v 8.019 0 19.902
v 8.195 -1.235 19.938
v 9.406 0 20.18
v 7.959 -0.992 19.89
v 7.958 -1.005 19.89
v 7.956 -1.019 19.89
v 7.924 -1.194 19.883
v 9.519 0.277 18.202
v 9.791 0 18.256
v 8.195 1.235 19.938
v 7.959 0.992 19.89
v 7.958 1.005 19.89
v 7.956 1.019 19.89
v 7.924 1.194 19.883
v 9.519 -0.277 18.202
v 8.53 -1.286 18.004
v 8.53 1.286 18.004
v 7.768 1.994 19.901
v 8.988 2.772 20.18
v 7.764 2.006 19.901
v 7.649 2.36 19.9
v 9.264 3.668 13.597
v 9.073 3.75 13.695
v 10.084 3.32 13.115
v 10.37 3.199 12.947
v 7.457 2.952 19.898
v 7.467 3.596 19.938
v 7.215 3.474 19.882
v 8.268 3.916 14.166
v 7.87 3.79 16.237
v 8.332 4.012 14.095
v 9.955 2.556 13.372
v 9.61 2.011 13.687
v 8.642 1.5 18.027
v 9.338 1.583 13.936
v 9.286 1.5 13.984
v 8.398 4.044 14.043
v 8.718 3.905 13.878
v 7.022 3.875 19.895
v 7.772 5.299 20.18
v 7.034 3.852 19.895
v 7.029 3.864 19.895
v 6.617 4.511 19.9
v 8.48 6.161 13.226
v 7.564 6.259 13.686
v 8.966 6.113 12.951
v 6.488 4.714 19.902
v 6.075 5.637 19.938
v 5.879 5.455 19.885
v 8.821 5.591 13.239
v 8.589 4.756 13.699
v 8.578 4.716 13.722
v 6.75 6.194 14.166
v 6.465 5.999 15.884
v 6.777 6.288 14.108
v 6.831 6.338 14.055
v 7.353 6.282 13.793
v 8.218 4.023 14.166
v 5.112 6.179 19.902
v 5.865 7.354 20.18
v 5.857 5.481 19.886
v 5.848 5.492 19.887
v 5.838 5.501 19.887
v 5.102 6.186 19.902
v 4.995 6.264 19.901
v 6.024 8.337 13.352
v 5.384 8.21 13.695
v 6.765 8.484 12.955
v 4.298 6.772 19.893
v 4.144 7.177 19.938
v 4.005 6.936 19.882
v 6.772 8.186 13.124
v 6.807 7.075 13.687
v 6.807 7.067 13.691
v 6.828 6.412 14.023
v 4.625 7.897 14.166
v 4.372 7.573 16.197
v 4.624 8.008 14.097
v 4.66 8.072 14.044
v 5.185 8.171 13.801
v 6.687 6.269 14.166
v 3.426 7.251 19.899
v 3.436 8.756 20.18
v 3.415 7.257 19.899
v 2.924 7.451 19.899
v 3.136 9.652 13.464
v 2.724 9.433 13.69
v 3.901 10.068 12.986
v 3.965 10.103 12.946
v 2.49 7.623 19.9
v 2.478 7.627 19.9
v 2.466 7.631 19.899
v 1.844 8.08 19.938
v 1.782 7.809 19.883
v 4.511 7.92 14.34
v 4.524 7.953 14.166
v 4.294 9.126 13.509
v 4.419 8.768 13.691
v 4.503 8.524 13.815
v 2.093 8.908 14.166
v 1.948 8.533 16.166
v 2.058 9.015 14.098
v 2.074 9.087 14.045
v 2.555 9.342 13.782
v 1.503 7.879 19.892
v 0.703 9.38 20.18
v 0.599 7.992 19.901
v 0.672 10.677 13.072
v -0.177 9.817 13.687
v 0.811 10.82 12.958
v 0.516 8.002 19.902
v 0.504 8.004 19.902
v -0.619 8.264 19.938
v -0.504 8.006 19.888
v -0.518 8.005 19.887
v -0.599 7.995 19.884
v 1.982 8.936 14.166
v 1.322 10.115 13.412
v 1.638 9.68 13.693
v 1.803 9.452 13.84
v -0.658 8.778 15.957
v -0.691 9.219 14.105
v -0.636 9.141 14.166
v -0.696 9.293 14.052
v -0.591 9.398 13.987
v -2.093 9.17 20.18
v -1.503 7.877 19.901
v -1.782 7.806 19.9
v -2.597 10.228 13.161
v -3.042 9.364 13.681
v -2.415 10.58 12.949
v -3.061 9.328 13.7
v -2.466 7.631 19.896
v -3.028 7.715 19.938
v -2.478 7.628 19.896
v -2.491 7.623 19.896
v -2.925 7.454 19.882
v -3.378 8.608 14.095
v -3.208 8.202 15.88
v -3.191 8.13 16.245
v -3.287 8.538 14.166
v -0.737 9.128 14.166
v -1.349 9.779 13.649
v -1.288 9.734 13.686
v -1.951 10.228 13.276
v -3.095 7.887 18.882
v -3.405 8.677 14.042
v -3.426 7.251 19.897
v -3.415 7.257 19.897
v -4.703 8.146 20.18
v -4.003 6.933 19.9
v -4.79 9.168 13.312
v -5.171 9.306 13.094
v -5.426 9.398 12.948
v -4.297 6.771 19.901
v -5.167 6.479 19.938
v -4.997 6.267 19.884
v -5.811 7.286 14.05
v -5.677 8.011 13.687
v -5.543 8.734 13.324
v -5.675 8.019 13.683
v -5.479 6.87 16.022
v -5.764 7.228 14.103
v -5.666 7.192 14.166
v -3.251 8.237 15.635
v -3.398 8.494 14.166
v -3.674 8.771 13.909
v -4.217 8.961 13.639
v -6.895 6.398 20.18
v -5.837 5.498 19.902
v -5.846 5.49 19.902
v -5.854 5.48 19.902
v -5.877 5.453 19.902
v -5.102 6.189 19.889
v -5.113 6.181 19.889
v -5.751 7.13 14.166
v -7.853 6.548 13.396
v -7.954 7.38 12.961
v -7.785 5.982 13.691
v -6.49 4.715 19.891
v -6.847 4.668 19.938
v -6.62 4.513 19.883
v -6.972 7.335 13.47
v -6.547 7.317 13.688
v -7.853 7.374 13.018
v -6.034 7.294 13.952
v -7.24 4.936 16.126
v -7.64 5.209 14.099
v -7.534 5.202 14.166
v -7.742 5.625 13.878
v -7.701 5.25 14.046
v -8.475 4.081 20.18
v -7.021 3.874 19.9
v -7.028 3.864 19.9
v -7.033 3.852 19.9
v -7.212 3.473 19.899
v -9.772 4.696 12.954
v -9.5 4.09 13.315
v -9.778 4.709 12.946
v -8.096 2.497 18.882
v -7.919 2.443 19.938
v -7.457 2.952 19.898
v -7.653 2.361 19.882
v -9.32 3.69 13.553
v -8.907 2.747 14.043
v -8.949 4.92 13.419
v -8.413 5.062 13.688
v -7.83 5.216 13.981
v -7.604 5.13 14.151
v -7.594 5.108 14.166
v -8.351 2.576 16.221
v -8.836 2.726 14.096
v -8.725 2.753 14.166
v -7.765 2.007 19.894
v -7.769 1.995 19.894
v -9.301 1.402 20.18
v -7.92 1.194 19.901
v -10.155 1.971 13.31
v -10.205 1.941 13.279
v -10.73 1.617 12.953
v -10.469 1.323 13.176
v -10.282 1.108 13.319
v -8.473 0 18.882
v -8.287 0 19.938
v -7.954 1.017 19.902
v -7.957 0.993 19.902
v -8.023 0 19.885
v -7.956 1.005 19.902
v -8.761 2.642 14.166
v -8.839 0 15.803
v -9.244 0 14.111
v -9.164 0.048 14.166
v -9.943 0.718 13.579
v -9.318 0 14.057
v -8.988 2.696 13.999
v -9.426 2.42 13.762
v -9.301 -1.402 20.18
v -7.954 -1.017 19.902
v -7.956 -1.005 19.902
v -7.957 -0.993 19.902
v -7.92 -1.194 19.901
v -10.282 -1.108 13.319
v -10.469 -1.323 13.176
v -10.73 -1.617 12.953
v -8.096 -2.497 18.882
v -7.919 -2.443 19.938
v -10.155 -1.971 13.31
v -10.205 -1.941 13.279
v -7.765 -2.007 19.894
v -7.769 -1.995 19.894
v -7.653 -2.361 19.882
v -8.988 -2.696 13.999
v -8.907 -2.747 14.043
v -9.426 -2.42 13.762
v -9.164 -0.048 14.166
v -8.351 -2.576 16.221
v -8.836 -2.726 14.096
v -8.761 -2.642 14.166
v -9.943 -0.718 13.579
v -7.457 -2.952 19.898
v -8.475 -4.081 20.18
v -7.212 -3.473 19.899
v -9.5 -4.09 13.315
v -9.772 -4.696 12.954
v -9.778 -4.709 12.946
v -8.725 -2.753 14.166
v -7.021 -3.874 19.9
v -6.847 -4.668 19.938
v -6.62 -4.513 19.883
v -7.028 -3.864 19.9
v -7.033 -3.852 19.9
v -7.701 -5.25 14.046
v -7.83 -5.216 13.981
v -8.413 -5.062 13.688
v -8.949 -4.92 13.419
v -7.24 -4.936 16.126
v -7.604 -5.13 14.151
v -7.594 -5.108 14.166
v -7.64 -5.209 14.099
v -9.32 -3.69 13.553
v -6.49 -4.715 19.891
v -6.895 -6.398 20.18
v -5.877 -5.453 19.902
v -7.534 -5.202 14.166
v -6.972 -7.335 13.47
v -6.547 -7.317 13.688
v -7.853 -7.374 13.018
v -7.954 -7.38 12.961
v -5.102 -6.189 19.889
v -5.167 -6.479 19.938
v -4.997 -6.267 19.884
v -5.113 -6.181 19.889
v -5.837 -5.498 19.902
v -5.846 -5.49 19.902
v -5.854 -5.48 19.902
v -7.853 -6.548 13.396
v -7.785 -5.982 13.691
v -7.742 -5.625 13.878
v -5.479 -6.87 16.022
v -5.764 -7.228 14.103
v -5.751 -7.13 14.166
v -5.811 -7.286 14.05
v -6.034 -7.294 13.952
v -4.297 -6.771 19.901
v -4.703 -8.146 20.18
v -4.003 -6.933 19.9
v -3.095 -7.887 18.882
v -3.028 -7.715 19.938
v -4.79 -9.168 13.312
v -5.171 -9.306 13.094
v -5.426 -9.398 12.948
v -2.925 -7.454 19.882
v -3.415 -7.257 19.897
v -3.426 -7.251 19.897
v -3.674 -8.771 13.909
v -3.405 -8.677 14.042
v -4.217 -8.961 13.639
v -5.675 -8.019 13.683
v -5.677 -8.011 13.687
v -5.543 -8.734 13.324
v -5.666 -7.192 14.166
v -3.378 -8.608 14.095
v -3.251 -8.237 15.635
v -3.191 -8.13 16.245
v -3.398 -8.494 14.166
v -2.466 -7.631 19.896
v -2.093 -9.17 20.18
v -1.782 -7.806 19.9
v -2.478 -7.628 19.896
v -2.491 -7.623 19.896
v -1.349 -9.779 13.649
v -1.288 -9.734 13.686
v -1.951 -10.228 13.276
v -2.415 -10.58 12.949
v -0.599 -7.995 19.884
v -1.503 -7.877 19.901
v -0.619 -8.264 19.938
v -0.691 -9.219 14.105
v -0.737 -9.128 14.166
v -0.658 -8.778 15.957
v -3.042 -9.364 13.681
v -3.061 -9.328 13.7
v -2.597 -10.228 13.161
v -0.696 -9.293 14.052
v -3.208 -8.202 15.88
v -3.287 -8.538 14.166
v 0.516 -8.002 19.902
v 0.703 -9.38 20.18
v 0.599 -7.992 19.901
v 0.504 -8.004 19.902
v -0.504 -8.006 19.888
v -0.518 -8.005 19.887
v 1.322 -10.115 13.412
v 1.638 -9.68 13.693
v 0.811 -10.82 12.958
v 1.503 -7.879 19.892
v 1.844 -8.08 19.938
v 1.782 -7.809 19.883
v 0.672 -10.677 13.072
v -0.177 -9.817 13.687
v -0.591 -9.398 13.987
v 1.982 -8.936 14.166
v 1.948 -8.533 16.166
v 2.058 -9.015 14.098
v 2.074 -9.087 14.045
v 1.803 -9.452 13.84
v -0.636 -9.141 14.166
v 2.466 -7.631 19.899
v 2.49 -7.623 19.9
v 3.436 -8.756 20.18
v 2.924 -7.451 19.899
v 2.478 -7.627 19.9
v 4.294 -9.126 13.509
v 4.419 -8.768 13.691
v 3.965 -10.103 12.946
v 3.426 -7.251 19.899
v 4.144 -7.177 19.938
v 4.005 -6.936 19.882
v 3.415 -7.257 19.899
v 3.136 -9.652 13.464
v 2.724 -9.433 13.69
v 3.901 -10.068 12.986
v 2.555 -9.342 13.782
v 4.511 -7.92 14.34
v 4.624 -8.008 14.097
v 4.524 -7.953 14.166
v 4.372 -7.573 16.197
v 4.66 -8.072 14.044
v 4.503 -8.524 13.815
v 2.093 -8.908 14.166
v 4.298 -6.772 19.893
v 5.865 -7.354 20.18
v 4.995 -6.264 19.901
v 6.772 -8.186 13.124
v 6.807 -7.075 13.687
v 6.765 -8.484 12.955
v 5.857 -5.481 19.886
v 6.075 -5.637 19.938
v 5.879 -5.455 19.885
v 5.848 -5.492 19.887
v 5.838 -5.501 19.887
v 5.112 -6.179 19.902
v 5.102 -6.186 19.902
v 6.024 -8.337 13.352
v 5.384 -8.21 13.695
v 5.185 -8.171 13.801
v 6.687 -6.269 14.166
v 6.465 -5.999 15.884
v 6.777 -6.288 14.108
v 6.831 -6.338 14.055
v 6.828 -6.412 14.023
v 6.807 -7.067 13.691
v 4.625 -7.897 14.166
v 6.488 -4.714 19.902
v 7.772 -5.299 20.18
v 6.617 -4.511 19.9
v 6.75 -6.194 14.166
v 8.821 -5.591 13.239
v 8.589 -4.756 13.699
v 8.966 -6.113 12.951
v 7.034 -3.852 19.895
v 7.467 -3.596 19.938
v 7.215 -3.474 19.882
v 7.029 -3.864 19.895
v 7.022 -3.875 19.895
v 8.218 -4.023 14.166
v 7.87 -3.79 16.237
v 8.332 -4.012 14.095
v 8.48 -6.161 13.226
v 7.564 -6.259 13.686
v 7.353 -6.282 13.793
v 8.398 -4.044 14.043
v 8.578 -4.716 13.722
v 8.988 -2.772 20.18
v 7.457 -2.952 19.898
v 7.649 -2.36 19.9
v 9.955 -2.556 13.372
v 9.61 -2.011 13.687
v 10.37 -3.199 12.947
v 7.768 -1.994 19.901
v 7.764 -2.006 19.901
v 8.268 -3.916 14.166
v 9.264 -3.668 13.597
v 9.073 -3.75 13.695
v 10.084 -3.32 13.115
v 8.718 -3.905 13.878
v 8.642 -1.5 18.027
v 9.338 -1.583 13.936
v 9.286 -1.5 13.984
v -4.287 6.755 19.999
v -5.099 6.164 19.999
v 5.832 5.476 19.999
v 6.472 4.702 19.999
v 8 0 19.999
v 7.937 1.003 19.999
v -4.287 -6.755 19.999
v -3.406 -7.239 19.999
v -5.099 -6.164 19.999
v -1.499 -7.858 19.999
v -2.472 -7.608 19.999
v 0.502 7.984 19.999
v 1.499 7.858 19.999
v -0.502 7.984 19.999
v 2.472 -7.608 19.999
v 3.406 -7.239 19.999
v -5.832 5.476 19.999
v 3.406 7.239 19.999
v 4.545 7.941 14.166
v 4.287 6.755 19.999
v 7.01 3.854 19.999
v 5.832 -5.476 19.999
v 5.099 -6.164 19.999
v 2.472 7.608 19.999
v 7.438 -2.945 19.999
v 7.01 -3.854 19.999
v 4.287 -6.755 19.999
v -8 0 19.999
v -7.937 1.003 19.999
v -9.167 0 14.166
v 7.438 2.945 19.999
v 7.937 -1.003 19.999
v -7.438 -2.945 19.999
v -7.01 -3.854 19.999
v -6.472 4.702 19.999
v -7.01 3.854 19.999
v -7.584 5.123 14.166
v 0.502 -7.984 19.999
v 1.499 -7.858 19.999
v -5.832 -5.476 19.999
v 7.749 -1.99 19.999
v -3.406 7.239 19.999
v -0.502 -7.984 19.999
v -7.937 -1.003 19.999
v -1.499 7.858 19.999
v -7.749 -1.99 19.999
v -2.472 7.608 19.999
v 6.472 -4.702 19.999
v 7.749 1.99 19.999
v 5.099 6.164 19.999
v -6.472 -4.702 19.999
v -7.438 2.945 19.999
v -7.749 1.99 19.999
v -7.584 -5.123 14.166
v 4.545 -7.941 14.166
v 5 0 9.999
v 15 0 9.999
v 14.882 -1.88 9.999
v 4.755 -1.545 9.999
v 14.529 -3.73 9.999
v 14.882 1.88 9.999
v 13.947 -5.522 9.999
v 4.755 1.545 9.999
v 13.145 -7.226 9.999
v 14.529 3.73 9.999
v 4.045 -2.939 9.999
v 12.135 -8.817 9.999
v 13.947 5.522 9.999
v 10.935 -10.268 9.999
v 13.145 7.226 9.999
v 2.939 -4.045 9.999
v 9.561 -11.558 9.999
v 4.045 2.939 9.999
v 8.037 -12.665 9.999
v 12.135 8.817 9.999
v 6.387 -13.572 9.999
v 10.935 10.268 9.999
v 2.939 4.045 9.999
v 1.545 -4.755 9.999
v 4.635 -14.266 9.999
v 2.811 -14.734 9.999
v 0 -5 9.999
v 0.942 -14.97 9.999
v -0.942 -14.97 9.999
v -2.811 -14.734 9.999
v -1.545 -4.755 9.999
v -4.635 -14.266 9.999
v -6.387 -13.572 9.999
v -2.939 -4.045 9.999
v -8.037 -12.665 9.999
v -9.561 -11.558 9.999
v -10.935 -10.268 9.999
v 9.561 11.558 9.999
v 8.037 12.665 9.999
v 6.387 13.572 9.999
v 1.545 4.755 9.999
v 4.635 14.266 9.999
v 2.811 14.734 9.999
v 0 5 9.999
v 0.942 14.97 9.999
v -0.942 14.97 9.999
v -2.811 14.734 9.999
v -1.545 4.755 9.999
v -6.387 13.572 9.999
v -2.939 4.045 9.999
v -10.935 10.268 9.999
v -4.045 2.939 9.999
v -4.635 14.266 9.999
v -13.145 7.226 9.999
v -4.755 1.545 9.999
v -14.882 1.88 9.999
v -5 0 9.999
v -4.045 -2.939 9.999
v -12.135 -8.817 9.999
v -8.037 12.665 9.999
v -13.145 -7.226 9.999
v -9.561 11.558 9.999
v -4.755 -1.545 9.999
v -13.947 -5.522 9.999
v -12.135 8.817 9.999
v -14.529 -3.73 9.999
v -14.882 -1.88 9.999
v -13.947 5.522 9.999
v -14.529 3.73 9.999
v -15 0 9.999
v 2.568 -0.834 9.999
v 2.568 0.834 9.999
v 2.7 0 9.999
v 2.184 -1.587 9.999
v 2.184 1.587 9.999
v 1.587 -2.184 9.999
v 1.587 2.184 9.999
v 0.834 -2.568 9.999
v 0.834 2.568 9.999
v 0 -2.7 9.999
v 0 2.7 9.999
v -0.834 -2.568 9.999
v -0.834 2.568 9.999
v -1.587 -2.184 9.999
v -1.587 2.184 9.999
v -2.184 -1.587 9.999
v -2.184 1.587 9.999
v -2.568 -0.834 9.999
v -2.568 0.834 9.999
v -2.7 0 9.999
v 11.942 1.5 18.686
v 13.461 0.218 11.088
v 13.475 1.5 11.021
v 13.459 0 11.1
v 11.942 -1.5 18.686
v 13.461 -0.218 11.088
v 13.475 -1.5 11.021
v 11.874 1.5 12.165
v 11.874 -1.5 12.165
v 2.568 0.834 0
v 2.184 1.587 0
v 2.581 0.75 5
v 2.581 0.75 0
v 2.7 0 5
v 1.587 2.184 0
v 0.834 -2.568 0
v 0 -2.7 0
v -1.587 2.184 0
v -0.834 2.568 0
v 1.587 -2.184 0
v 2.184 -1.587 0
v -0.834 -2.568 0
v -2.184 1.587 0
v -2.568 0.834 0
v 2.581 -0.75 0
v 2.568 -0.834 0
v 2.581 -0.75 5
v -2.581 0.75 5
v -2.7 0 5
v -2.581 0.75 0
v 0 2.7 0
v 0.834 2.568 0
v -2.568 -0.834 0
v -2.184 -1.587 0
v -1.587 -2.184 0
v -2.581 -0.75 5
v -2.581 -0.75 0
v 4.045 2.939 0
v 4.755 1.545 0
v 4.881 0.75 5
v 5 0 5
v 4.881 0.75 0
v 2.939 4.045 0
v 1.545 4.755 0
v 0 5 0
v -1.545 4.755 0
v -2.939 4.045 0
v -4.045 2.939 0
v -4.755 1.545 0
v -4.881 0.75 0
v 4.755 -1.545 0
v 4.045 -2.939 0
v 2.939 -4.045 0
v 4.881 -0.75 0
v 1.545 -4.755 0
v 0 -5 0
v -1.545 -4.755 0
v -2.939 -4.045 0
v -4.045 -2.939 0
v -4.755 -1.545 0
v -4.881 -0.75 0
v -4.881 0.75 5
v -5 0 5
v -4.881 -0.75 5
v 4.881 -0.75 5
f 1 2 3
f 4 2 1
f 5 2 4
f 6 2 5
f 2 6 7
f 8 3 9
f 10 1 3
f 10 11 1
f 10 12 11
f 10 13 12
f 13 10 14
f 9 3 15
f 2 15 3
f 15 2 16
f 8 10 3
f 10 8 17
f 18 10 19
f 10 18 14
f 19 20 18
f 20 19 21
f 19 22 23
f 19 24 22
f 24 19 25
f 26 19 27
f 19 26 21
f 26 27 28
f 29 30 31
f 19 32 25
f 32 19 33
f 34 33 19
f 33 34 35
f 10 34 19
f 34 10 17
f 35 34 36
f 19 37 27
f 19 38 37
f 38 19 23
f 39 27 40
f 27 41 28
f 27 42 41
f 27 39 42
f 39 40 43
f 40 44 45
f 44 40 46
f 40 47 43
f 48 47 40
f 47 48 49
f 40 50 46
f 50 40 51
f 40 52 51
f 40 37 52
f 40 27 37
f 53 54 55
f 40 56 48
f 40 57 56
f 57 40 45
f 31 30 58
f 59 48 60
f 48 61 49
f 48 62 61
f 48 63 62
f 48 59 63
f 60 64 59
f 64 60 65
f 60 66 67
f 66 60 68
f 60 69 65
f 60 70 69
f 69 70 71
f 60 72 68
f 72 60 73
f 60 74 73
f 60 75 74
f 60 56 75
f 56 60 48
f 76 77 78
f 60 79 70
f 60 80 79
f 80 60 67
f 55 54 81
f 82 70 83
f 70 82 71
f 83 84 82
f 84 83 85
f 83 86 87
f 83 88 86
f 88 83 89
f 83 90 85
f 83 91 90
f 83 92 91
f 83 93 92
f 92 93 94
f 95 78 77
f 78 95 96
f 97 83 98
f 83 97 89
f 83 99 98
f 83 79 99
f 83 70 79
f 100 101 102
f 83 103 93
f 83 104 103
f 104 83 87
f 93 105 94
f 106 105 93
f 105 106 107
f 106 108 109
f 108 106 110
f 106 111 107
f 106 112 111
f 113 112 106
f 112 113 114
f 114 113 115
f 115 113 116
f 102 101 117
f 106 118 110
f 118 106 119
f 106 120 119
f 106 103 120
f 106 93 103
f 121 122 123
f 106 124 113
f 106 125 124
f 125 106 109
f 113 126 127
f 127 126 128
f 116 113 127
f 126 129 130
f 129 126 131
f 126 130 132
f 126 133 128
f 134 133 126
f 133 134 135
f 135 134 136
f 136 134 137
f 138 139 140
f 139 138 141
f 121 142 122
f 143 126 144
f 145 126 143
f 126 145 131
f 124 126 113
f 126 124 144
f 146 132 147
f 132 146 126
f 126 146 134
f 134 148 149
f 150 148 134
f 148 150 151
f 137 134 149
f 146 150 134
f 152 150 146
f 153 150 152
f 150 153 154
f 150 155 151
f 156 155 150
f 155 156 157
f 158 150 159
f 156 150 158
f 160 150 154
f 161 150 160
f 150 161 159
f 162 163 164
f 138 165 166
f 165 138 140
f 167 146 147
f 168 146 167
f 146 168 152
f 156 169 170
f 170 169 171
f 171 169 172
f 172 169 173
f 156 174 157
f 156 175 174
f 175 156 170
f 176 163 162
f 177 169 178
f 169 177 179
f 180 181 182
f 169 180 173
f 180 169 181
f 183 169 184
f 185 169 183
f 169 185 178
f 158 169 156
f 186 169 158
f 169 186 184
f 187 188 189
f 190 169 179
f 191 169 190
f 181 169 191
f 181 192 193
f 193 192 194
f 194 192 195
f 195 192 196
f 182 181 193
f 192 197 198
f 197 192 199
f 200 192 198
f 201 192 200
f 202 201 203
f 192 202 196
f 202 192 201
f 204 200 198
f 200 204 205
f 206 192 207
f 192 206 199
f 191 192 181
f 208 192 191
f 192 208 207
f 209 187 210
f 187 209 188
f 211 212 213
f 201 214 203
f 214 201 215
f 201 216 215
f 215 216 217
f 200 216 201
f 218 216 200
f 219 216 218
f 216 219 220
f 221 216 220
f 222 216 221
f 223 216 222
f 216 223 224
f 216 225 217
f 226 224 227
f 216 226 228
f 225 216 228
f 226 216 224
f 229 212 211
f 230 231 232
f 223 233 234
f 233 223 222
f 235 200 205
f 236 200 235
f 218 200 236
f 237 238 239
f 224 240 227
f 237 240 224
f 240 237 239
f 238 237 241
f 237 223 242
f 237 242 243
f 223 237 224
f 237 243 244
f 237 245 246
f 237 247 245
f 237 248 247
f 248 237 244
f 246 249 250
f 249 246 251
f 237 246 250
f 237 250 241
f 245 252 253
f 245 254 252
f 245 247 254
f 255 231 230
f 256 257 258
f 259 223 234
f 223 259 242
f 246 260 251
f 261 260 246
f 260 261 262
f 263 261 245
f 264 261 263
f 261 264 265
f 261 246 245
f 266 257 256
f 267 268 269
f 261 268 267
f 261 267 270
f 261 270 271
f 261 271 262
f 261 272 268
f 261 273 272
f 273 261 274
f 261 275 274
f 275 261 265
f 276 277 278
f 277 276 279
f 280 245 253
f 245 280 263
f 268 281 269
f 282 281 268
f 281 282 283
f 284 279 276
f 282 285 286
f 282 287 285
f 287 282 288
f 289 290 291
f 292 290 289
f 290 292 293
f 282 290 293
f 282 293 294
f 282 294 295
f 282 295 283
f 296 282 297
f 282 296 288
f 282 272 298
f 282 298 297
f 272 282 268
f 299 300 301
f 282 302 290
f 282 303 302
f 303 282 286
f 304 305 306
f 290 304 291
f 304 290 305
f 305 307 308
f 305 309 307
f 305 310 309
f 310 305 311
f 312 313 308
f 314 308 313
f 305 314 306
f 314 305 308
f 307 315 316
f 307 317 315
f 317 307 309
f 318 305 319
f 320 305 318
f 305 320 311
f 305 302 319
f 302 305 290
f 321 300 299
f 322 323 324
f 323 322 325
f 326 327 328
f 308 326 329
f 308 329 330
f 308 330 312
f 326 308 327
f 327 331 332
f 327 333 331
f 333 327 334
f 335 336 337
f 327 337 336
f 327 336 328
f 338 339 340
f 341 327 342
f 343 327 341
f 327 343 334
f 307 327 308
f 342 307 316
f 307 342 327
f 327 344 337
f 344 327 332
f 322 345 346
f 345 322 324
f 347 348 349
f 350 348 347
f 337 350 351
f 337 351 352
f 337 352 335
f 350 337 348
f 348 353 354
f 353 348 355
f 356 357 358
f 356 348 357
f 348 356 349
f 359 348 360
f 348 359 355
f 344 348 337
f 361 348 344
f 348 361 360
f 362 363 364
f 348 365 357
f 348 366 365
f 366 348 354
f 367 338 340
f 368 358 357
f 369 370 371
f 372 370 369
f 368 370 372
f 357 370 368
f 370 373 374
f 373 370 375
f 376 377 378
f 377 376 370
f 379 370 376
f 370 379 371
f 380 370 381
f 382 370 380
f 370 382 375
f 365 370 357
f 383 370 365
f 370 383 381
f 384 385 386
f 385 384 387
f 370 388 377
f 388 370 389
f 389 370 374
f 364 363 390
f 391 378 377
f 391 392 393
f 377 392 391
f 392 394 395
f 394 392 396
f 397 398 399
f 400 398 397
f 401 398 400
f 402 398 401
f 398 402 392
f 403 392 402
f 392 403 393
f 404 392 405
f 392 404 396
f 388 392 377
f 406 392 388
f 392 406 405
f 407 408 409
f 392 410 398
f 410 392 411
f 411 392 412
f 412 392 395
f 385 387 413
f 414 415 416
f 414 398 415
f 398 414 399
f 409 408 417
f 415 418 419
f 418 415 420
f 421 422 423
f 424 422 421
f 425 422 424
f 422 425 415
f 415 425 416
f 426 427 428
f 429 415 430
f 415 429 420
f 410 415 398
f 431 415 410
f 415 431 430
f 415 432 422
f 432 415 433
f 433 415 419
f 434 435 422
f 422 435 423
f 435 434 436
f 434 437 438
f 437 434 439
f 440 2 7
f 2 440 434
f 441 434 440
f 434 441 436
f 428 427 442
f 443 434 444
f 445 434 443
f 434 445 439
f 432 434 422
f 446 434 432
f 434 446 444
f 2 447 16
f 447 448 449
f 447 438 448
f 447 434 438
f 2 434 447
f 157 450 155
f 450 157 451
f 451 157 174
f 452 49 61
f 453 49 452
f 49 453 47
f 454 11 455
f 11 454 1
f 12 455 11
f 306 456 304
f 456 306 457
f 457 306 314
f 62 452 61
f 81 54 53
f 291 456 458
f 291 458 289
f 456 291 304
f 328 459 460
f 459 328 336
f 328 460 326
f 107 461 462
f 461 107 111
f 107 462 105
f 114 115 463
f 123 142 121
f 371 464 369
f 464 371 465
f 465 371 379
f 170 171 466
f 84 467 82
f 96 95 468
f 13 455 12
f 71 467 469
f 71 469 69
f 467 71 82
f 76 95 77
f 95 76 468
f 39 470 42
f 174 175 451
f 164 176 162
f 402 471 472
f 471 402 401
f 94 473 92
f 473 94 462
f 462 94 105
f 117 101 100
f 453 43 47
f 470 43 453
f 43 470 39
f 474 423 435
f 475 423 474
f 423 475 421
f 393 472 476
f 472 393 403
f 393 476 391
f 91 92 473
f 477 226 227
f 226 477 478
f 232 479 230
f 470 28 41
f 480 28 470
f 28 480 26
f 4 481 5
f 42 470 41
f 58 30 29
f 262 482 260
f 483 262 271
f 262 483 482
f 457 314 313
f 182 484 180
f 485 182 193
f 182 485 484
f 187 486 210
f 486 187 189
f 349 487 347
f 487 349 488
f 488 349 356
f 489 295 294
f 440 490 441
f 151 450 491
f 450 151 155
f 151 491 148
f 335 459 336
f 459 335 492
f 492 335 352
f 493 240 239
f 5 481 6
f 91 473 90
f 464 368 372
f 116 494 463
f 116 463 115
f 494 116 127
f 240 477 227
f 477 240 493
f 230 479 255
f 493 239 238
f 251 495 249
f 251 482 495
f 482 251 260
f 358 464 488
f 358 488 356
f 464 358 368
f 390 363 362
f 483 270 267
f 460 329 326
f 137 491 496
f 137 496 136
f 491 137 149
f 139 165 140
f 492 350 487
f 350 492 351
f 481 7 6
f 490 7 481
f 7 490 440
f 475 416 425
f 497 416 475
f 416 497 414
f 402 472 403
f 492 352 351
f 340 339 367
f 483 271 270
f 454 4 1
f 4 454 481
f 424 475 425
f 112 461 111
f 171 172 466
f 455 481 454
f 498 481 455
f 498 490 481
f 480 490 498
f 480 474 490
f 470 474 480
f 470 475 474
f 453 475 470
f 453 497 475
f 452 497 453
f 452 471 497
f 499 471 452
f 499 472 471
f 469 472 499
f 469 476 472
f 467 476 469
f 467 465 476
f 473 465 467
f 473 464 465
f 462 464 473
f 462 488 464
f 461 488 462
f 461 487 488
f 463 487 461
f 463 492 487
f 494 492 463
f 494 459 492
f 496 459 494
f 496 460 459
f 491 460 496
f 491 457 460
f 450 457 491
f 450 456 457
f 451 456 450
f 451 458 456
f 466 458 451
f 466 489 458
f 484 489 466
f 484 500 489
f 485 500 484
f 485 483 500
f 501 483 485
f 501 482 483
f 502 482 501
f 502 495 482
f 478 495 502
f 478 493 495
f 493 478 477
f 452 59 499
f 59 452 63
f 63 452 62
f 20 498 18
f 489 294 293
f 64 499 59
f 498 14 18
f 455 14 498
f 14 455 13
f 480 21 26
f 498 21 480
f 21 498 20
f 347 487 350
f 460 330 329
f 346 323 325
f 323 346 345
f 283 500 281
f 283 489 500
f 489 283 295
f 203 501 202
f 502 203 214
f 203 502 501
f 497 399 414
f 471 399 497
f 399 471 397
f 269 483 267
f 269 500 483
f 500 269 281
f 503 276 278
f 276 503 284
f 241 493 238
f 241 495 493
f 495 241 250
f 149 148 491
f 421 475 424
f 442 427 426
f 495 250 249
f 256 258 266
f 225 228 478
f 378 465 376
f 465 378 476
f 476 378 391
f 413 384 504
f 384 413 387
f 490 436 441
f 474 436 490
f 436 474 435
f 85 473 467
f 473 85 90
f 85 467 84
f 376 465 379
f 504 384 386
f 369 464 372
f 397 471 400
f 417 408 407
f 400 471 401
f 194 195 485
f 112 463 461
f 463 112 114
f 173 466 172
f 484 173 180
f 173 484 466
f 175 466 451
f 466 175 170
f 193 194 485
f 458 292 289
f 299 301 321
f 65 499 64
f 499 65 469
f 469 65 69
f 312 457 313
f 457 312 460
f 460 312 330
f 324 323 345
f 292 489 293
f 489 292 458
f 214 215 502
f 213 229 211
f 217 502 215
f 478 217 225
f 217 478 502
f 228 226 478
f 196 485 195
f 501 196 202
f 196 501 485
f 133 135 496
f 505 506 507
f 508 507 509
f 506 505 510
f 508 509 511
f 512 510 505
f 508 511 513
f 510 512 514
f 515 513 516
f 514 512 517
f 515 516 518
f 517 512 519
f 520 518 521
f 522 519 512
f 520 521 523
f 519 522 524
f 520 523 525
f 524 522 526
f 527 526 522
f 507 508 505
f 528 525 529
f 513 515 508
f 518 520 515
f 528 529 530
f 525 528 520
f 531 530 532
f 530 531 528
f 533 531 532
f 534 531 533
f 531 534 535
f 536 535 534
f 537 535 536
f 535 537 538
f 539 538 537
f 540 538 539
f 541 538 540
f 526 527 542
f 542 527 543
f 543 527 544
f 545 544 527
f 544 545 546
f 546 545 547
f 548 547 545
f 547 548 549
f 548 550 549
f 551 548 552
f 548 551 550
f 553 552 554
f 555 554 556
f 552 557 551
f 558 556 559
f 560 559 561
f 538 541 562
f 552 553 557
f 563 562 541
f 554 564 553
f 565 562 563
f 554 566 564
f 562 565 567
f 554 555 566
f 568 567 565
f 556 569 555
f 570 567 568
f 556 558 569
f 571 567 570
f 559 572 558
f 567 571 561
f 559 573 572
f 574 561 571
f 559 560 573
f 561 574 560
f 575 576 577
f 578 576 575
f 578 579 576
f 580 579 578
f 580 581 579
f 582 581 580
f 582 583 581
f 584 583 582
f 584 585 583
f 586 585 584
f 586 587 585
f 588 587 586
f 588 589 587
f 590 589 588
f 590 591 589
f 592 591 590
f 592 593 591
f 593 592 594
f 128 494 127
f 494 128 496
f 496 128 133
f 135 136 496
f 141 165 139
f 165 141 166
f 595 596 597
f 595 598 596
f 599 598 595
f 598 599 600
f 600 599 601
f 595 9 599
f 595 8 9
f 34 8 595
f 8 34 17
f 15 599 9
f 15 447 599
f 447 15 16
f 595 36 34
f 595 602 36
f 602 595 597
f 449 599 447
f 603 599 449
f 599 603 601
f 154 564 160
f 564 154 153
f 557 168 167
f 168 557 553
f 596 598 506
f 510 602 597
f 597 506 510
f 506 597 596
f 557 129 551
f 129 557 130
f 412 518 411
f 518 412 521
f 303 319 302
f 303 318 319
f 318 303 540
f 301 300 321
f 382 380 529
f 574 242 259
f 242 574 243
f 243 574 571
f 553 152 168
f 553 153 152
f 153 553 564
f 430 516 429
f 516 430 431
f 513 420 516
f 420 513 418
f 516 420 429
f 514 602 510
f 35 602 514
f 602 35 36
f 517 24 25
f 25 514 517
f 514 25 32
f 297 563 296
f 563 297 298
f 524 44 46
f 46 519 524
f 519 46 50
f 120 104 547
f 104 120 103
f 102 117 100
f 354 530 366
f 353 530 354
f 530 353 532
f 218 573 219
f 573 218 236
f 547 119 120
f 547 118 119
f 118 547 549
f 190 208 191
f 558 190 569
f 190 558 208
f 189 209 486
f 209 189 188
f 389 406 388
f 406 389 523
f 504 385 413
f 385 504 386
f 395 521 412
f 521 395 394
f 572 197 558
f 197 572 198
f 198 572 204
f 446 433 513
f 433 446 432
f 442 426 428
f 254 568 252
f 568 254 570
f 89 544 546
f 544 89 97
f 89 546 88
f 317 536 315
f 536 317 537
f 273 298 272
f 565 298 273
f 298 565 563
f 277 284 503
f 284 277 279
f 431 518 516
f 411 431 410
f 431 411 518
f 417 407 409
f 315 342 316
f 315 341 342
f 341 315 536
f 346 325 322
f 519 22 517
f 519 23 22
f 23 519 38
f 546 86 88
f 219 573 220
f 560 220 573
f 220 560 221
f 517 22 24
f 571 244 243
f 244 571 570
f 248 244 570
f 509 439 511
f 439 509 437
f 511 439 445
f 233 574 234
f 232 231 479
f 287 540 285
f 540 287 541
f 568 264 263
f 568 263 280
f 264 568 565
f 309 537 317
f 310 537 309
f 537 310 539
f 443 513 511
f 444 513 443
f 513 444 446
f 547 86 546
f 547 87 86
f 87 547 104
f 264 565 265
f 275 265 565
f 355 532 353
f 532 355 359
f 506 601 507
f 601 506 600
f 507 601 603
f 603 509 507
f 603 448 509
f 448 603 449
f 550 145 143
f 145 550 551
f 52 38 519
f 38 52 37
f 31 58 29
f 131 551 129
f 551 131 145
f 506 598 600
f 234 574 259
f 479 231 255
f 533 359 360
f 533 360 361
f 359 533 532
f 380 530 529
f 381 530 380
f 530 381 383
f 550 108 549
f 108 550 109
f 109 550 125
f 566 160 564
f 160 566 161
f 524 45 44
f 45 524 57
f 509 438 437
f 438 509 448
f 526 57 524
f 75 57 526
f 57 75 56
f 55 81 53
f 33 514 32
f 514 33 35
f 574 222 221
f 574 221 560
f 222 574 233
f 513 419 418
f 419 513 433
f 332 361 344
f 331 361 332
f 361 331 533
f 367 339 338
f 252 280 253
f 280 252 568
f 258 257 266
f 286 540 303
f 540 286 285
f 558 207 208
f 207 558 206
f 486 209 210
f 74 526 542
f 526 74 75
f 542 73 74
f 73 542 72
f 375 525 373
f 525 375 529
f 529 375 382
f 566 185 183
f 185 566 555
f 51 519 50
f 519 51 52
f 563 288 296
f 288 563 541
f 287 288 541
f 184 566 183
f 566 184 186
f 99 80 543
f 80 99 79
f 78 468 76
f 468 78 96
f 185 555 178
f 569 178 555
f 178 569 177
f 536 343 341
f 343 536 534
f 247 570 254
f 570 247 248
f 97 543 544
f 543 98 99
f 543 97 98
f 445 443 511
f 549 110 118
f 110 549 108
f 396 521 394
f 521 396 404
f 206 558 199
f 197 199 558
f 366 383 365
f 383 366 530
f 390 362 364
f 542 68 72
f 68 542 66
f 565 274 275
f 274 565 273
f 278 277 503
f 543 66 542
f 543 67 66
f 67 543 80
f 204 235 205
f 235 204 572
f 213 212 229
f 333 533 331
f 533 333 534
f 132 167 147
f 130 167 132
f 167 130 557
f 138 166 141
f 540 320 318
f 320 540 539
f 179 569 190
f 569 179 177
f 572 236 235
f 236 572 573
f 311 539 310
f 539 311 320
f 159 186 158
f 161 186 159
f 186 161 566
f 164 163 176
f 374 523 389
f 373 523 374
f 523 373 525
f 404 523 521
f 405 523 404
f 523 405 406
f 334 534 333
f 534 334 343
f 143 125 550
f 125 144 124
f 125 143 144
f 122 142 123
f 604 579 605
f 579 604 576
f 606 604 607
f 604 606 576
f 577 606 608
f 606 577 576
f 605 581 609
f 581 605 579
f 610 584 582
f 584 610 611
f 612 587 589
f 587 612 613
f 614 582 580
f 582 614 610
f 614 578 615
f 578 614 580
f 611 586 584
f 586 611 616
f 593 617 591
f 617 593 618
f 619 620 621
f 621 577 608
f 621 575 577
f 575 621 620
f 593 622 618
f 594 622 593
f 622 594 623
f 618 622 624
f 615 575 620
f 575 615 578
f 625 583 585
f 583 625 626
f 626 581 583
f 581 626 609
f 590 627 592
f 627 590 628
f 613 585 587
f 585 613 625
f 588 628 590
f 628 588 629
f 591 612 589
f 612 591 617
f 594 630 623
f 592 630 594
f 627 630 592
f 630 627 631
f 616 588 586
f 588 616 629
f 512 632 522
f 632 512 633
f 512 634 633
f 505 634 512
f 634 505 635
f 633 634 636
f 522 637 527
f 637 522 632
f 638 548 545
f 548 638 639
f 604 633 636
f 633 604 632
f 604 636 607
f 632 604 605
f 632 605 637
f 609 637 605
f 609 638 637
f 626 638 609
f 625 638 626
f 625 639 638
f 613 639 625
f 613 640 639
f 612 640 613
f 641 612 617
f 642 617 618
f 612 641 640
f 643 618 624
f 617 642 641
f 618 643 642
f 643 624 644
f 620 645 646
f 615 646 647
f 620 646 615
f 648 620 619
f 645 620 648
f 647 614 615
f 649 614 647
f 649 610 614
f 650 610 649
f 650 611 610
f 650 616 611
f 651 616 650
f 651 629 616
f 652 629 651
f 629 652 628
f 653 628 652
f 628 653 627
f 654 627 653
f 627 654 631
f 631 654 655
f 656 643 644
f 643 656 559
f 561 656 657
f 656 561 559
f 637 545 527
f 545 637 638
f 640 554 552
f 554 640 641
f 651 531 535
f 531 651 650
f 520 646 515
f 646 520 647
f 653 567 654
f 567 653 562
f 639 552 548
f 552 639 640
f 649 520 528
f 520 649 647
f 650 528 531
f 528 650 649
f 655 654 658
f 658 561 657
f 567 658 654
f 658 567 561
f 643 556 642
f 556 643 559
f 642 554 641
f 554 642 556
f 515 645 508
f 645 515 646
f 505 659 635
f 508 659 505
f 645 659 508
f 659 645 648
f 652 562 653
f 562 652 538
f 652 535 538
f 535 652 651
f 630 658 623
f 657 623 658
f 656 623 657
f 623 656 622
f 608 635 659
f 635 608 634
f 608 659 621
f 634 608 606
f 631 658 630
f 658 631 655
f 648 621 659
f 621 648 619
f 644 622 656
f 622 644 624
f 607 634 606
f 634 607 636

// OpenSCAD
//////////////////////////
// Customizable settings
//////////////////////////


// Diameter of the hole on the bottom (in mm).
HoleDiameter = 5.4;

// Depth of the hole in the bottom (in mm).  If you want the hole to go all the way through then set this to a number larger than the total height of the object.
HoleDepth = 12.5;

// If you want a D-shaped hole, set this to the thickness of the flat side (in mm).  Larger values for the flat make the hole smaller.
HoleFlatThickness = 0;

// Height (in mm).  If dome cap is selected, it is not included in height.  The shaft length is also not counted.
KnobHeight = 10;

// Diameter of base of round part of knob (in mm).  (Knurled ridges are not included in this measurement.)
KnobDiameter = 20;

// Shape of top of knob.  "Recessed" type can be painted.
CapType = 0;	// [0:Flat, 1:Recessed, 2:Dome]

// Do you want a large timer-knob style pointer?
TimerKnob=0;	// [0:No, 1:Yes]

// Would you like a divot on the top to indicate direction?
Pointer1 = 0;	// [0:No, 1:Yes]

// Would you like a line (pointer) on the front to indicate direction?
Pointer2 = 1;	// [0:No, 1:Yes]

// Do you want finger ridges around the knob?
Knurled = 1;	// [0:No, 1:Yes]

// 0 = A cylindrical knob, any other value will taper the knob.
TaperPercentage = 20;		// [0:0%, 10:10%, 20:20%, 30:30%, 40:40%, 50:50%]

// Width of "dial" ring (in mm).  Set to zero if you don't want the ring.
RingWidth = 5;

// The number of markings on the dial.  Set to zero if you don't want markings.  (RingWidth must be non-zero.)
RingMarkings = 0;

// diameter of the hole for the setscrew (in mm).  If you don't need a hole, set this to zero.
ScrewHoleDiameter = 0;

// Length of the shaft on the bottom of the knob (in mm).  If you don't want a shaft, set this value to zero.
ShaftLength = 10;

// Diameter of the shaft on the bottom of the knob (in mm).  (ShaftLength must be non-zero.)
ShaftDiameter = 10;

// Would you like a notch in the shaft?  It can be used for a press-on type knob (rather than using a setscrew).  (ShaftLength must be non-zero.)
NotchedShaft = 1;	// [0:No, 1:Yes]
NotchWidth = 1.5;
NotchRotation = 0;  // [0,90,180,270,etc]


//////////////////////////
//Advanced settings
//////////////////////////

RingThickness = 5*1;
DivotDepth = 1.5*1;
MarkingWidth = 1.5*1;
DistanceBetweenKnurls = 3*1;
TimerKnobConst = 1.8*1;



//////////////////////////
//Calculations
//////////////////////////

PI=3.14159265*1;
KnobMajorRadius = KnobDiameter/2;
KnobMinorRadius = KnobDiameter/2 * (1 - TaperPercentage/100);
KnobRadius = KnobMinorRadius + (KnobMajorRadius-KnobMinorRadius)/2;
KnobCircumference = PI*KnobDiameter;
Knurls = round(KnobCircumference/DistanceBetweenKnurls);
Divot=CapType;

TaperAngle=asin(KnobHeight / (sqrt(pow(KnobHeight, 2) +
		pow(KnobMajorRadius-KnobMinorRadius,2)))) - 90;

DivotRadius = KnobMinorRadius*.4;


union()
{
translate([0, 0, (ShaftLength==0)? 0 : ShaftLength-0.001])
difference()
{
union()
{
	// Primary knob cylinder
	cylinder(h=KnobHeight, r1=KnobMajorRadius, r2=KnobMinorRadius,
			$fn=50);
	
	if (Knurled)
		for (i=[0 : Knurls-1])
			rotate([0, 0, i * (360/Knurls)])
				translate([KnobRadius, 0, KnobHeight/2])
					rotate([0, TaperAngle, 0]) rotate([0, 0, 45])
						cube([2, 2, KnobHeight+.001], center=true);

 	if (RingMarkings>0)
		for (i=[0 : RingMarkings-1])
			rotate([0, 0, i * (360/RingMarkings)])
				translate([KnobMajorRadius + RingWidth/2, 0, 1])
					cube([RingWidth*.5, MarkingWidth, 2], center=true);		
	
	if (Pointer2==1)
		translate([KnobRadius, 0, KnobHeight/2-2])
			rotate([0, TaperAngle, 0])
				cube([8, 3, KnobHeight], center=true);		

	if (RingWidth>0)
		translate([0, 0, RingThickness/2])
			cylinder(r1=KnobMajorRadius + RingWidth, r2=KnobMinorRadius,
					h=RingThickness, $fn=50, center=true);

	if (Divot==2)
		translate([0, 0, KnobHeight])
			difference()
			{
				scale([1, 1, 0.5])
					sphere(r=KnobMinorRadius, $fn=50, center=true);

				translate([0, 0, 0-(KnobMinorRadius+.001)])
					cube([KnobMinorRadius*2.5, KnobMinorRadius*2.5,
							KnobMinorRadius*2], center=true);
			}

	if (TimerKnob==1) intersection()
		{
			translate([0, 0, 0-(KnobDiameter*TimerKnobConst) + KnobHeight])
			sphere(r=KnobDiameter*TimerKnobConst, $fn=50, center=true);		
	
			translate([0-(KnobDiameter*TimerKnobConst)*0.1, 0,
					KnobHeight/2])
				scale([1, 0.5, 1])
					cylinder(h=KnobHeight, r=(KnobDiameter*TimerKnobConst) *
							0.8, $fn=3, center=true);
		}
}

// Pointer1: Offset hemispherical divot
if (Pointer1==1)
	translate([KnobMinorRadius*.55, 0, KnobHeight + DivotRadius*.6])
		sphere(r=DivotRadius, $fn=40);

// Divot1: Centered cylynrical divot
if (Divot==1)
	translate([0, 0, KnobHeight])
		cylinder(h=DivotDepth*2, r=KnobMinorRadius-1.5, $fn=50,
				center=true);

if (ShaftLength==0)
{
	// Hole for shaft
	translate([0, 0, HoleDepth/2 - 0.001])
		difference()
		{
			cylinder(r=HoleDiameter/2, h=HoleDepth, $fn=20,
					center=true);
	
			// Flat for D-shaped hole
			translate([(0-HoleDiameter)+HoleFlatThickness, 0, 0])
				cube([HoleDiameter, HoleDiameter, HoleDepth+.001],
						center=true);
		}
	
	// Hole for setscrew
	if (ScrewHoleDiameter>0)
		translate([0 - (KnobMajorRadius+RingWidth+1)/2, 0,
				HoleDepth/2])
			rotate([0, 90, 0])
			cylinder(h=(KnobMajorRadius+RingWidth+1),
					r=ScrewHoleDiameter/2, $fn=20, center=true);
}

// Make sure bottom ends at z=0
translate([0, 0, -10])
	cube([(KnobMajorRadius+RingWidth) * 3,
			(KnobMajorRadius+RingWidth) * 3, 20], center=true);
}

if (ShaftLength>0)
	difference()
	{
		translate([0, 0, ShaftLength/2])
			cylinder(h=ShaftLength, r=ShaftDiameter/2, $fn=20,
					center=true);

		if (NotchedShaft==1)
		{
            rotate([0,0,90+NotchRotation])
            cube([NotchWidth, ShaftDiameter*2, ShaftLength],
					center=true);
		}

		// Hole for shaft
		translate([0, 0, HoleDepth/2 - 0.001])
			difference()
			{
				cylinder(r=HoleDiameter/2, h=HoleDepth, $fn=20,
						center=true);
		
				// Flat for D-shaped hole
				translate([(0-HoleDiameter)+HoleFlatThickness, 0, 0])
					cube([HoleDiameter, HoleDiameter, HoleDepth+.001],
							center=true);
			}
		
		// Hole for setscrew
		if (ScrewHoleDiameter>0)
			translate([0 - (KnobMajorRadius+RingWidth+1)/2, 0,
					HoleDepth/2])
				rotate([0, 90, 0])
				cylinder(h=(KnobMajorRadius+RingWidth+1),
						r=ScrewHoleDiameter/2, $fn=20, center=true);
	}
}
